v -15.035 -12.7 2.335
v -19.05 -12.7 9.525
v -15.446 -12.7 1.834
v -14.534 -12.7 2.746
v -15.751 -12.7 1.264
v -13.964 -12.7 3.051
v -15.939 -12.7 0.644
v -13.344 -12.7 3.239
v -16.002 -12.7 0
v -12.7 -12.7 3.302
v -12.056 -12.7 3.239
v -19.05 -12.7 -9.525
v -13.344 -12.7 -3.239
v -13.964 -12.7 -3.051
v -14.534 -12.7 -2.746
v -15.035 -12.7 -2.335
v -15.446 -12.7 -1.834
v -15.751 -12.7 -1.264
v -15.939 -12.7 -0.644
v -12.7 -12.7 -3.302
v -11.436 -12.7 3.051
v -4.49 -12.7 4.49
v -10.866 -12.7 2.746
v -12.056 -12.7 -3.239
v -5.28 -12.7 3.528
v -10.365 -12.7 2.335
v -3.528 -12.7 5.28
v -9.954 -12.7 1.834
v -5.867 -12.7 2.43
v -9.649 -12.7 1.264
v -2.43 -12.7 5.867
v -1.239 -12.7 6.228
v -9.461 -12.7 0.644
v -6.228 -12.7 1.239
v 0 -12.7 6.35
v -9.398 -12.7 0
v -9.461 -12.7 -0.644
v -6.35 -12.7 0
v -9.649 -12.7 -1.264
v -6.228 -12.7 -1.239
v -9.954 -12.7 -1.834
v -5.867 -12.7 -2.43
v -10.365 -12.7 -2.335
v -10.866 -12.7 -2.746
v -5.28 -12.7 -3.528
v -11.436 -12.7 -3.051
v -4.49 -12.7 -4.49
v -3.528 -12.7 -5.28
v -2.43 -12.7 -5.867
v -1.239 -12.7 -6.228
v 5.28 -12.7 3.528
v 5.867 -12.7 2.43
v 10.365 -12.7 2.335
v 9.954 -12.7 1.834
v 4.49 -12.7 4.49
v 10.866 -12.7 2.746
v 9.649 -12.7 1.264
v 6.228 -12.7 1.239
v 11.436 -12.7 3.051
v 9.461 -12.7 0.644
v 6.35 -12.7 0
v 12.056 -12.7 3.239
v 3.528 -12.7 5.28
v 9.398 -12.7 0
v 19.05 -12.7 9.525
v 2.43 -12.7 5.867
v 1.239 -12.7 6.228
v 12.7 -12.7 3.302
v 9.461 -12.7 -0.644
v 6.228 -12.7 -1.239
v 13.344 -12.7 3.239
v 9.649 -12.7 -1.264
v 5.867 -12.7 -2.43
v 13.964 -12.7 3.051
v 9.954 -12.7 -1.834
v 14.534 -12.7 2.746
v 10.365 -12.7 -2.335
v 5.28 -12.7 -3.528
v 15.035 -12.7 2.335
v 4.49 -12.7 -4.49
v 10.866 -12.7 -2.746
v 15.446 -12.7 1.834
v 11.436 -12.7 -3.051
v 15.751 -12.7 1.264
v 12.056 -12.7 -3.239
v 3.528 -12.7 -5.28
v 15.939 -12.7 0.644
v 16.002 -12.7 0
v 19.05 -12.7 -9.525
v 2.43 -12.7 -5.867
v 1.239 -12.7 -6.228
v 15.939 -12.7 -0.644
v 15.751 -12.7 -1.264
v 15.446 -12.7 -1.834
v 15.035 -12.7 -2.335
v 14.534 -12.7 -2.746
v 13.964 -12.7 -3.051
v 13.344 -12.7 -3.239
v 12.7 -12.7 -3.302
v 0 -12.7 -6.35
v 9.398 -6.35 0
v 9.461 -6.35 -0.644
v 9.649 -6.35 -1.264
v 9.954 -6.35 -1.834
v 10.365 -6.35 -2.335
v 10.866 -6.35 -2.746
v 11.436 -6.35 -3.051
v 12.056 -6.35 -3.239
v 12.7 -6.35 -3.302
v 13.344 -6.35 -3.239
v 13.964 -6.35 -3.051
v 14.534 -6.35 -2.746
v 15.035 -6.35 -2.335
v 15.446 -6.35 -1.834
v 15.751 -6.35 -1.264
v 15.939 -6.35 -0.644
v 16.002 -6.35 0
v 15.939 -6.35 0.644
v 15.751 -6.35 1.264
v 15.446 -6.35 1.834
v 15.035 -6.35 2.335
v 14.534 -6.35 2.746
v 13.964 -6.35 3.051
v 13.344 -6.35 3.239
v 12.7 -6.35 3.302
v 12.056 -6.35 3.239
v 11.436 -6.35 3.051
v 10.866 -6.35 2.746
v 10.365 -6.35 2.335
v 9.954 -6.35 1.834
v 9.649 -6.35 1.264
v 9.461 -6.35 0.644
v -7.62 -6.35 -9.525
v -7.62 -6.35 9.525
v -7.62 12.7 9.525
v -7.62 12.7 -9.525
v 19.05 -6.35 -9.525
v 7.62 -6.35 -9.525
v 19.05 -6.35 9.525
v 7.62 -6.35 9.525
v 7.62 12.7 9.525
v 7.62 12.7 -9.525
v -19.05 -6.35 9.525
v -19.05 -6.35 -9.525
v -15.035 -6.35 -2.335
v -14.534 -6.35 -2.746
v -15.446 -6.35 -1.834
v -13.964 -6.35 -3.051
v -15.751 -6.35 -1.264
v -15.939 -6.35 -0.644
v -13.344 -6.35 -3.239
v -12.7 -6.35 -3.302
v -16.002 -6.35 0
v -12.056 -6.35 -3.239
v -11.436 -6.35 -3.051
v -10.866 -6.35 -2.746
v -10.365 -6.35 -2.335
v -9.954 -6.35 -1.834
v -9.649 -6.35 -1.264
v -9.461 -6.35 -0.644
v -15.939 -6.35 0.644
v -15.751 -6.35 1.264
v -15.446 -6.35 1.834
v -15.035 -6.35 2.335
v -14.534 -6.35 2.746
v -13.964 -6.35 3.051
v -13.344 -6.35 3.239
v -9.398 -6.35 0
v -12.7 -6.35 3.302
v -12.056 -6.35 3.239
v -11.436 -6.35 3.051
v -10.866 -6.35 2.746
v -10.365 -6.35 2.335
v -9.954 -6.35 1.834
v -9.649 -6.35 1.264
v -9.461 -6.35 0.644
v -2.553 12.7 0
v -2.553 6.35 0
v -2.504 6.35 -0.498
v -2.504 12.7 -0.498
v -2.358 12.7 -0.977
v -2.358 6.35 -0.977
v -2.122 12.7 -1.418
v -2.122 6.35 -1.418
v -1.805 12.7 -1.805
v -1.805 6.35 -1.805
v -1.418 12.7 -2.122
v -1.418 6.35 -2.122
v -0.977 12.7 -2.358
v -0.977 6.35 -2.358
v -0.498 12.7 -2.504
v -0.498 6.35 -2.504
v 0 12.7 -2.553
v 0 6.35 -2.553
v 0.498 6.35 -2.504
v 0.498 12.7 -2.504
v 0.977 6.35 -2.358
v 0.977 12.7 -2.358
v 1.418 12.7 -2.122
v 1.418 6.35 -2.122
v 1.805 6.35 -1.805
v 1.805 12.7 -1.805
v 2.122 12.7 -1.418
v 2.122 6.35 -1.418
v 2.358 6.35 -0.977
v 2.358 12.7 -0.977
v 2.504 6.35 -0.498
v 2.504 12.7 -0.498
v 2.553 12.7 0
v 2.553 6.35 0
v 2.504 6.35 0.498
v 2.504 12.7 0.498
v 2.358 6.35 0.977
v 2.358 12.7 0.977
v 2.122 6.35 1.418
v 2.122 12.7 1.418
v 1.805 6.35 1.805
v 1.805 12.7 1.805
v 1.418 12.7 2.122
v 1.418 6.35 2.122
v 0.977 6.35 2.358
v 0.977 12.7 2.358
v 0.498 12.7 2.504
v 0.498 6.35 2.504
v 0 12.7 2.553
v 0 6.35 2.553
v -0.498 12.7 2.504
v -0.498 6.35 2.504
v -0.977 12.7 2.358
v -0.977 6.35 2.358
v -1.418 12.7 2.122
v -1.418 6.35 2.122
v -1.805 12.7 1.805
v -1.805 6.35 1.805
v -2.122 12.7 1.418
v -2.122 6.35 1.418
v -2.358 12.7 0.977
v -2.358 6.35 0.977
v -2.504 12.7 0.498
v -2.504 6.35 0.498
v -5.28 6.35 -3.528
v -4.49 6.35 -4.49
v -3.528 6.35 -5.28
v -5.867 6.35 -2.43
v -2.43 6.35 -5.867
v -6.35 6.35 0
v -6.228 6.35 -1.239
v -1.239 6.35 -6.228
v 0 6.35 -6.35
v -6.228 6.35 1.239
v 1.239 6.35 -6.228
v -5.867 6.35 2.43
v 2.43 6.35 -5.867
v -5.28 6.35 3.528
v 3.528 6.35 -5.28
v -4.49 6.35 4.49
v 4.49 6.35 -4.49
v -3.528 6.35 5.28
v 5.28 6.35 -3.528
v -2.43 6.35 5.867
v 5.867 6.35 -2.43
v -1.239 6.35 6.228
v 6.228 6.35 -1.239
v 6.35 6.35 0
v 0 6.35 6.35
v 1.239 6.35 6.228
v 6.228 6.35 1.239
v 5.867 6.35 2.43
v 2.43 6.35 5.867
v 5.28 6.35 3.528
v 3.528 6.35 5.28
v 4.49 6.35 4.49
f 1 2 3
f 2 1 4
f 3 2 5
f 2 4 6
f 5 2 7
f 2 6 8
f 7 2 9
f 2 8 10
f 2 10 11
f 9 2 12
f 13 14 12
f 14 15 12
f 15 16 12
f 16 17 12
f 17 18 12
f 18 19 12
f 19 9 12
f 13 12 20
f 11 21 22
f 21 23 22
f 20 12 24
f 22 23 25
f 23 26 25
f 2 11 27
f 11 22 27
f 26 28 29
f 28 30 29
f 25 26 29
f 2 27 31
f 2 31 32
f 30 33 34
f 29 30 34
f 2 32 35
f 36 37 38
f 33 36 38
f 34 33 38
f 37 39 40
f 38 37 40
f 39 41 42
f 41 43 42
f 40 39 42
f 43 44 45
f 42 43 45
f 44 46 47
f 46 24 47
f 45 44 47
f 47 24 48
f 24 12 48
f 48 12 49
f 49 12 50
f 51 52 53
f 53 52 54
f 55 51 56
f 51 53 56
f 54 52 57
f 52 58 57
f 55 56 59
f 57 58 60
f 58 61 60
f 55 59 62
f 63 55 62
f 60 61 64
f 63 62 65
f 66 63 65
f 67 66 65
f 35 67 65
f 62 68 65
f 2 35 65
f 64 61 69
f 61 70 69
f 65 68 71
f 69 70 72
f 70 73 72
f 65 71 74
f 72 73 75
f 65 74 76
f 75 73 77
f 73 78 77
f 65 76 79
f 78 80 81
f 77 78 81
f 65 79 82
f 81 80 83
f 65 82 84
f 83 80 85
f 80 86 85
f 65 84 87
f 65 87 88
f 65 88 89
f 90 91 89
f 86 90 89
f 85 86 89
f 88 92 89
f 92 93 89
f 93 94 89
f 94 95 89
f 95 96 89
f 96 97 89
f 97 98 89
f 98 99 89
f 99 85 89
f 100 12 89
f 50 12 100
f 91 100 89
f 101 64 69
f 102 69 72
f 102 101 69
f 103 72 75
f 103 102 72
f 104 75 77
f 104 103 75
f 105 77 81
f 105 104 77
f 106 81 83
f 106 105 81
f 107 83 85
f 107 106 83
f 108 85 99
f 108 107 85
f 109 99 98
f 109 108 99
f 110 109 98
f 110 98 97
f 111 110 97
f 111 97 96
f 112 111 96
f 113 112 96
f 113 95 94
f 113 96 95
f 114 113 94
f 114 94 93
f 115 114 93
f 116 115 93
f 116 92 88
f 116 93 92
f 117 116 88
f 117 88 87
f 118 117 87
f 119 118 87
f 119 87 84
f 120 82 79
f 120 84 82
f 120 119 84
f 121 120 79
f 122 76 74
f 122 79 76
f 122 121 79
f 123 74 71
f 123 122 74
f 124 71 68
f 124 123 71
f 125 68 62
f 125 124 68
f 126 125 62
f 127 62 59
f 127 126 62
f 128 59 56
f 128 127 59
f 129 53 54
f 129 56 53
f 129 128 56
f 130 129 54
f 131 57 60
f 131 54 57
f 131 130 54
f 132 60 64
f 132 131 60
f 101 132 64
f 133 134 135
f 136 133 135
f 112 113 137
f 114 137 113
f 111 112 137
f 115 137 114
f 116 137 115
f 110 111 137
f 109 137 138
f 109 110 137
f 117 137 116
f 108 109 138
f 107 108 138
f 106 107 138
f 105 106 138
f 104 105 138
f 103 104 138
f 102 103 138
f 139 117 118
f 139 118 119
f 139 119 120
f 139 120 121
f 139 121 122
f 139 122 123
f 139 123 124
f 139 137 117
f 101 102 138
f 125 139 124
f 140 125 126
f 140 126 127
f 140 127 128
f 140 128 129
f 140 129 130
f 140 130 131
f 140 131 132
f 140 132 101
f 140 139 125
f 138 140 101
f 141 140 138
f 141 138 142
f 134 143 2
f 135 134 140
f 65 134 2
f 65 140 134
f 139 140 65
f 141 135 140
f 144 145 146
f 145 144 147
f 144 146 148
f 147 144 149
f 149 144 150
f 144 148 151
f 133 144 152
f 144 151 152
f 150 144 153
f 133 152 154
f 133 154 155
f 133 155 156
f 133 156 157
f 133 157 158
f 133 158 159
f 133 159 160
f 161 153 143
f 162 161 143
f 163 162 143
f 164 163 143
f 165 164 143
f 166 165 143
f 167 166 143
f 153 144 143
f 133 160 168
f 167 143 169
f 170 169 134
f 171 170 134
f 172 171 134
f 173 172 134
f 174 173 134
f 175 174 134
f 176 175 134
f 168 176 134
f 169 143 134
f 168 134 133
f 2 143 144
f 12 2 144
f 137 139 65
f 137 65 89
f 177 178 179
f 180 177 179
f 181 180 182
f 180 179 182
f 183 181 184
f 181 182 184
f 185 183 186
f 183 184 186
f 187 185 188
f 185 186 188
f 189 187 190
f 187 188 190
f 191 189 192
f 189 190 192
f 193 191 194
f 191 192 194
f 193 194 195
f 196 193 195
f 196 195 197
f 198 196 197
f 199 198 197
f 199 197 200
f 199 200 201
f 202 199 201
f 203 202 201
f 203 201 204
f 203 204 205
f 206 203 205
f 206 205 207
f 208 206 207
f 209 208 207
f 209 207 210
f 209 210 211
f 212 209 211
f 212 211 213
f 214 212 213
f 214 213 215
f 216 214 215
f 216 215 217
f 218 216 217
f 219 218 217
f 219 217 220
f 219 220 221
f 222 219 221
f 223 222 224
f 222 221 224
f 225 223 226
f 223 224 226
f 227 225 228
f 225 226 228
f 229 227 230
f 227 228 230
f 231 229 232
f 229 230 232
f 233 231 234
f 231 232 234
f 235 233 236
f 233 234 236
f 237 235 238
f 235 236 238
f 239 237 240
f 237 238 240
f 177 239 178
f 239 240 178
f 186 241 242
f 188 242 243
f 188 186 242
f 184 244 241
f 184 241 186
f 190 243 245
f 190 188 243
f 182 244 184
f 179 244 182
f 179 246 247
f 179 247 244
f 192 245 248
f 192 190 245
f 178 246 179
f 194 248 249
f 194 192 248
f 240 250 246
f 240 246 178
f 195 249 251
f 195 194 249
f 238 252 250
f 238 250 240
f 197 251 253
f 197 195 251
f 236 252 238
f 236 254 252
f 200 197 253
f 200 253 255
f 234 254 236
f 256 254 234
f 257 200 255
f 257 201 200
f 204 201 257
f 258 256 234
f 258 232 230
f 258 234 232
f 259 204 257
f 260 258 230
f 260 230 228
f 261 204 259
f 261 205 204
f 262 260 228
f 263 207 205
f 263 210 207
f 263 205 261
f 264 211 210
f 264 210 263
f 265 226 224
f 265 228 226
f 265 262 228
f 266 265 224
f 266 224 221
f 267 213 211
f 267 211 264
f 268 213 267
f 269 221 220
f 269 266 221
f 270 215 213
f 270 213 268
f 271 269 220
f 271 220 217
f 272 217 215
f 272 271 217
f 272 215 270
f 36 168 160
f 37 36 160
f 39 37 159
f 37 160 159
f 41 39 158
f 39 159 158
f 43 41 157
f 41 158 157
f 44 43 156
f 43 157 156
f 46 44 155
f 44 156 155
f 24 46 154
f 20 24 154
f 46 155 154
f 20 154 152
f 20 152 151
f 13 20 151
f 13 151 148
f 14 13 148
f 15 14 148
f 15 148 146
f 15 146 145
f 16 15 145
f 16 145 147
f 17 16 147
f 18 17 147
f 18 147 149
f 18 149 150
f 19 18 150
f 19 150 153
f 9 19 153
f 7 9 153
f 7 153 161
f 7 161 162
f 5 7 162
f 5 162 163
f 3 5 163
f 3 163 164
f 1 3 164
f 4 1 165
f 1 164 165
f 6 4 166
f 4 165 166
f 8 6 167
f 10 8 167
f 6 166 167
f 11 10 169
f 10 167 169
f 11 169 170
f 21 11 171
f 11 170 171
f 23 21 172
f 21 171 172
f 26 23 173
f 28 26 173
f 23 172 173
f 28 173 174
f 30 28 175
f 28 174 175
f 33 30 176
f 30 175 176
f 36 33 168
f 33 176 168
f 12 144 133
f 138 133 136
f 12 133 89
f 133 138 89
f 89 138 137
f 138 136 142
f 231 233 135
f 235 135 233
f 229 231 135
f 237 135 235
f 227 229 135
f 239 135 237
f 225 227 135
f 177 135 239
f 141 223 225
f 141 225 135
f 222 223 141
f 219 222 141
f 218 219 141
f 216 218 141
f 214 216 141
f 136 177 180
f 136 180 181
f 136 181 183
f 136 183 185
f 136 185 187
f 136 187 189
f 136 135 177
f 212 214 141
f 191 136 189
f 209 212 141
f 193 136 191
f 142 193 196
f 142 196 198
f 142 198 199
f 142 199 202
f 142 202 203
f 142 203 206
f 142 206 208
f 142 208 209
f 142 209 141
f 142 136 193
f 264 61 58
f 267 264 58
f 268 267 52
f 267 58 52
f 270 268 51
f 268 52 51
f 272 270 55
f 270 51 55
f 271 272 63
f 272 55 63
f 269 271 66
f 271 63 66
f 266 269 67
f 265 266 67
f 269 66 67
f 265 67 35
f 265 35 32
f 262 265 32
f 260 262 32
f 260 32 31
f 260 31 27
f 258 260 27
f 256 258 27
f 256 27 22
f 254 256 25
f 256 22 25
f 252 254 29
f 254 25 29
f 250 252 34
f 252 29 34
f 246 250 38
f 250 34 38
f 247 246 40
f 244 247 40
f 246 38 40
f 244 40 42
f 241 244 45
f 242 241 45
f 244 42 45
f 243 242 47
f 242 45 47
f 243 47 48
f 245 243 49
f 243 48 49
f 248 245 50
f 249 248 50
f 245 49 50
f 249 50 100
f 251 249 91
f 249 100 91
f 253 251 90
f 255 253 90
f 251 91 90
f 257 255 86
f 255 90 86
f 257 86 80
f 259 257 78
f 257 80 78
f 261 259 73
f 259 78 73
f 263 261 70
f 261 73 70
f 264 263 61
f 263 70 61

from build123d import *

# Parameters (mm, degrees)
SKETCH1_W               = 38.1
SKETCH1_H               = 19.05
BOSS_EXTRUDE1_DEPTH     = 12.7
SKETCH2_W               = 11.43
SKETCH2_H               = 19.05
CUT_EXTRUDE1_DEPTH      = 20.05
SKETCH3_R               = 3.302
CUT_EXTRUDE2_DEPTH      = 7.35
SKETCH7_R               = 6.35
CUT_EXTRUDE6_DEPTH      = 19.05
F_1_4_20_TAPPED_HOLE2_D = 5.1054


with BuildPart() as part:
    # Sketch1 → Boss-Extrude1 (new body, symmetric)
    with BuildSketch(Plane(origin=(0, 0, 0), x_dir=(1, 0, 0), z_dir=(0, 1, 0))):
        Rectangle(SKETCH1_W, SKETCH1_H)
    extrude(amount=BOSS_EXTRUDE1_DEPTH, both=True)

    # Sketch2 → Cut-Extrude1 (cut, through all)
    with BuildSketch(Plane.XY.offset(9.525)):
        with Locations((-13.335, 3.175)):
            Rectangle(SKETCH2_W, SKETCH2_H)
    cut_extrude1 = extrude(amount=-CUT_EXTRUDE1_DEPTH, mode=Mode.SUBTRACT)

    # Sketch3 → Cut-Extrude2 (cut, through all)
    with BuildSketch(Plane(origin=(0, -6.35, 0), x_dir=(1, 0, 0), z_dir=(0, 1, 0))):
        with Locations((-12.7, 0)):
            Circle(SKETCH3_R)
    cut_extrude2 = extrude(amount=-CUT_EXTRUDE2_DEPTH, mode=Mode.SUBTRACT)

    # Mirror1: Cut-Extrude1, Cut-Extrude2 across plane
    add(cut_extrude1.mirror(Plane(origin=(0, 0, 0), x_dir=(0, 0, 1), z_dir=(1, 0, 0))), mode=Mode.SUBTRACT)
    add(cut_extrude2.mirror(Plane(origin=(0, 0, 0), x_dir=(0, 0, 1), z_dir=(1, 0, 0))), mode=Mode.SUBTRACT)

    # Sketch7 → Cut-Extrude6 (cut)
    with BuildSketch(Plane.XZ.offset(12.7)):
        Circle(SKETCH7_R)
    extrude(amount=-CUT_EXTRUDE6_DEPTH, mode=Mode.SUBTRACT)

    # 1/4-20 Tapped Hole2 (through all)
    with Locations(Plane(origin=(0, 12.7, 0), x_dir=(1, 0, 0), z_dir=(0, 1, 0))):
        with Locations((0, 0)):
            Hole(F_1_4_20_TAPPED_HOLE2_D / 2)


solid = part.part
